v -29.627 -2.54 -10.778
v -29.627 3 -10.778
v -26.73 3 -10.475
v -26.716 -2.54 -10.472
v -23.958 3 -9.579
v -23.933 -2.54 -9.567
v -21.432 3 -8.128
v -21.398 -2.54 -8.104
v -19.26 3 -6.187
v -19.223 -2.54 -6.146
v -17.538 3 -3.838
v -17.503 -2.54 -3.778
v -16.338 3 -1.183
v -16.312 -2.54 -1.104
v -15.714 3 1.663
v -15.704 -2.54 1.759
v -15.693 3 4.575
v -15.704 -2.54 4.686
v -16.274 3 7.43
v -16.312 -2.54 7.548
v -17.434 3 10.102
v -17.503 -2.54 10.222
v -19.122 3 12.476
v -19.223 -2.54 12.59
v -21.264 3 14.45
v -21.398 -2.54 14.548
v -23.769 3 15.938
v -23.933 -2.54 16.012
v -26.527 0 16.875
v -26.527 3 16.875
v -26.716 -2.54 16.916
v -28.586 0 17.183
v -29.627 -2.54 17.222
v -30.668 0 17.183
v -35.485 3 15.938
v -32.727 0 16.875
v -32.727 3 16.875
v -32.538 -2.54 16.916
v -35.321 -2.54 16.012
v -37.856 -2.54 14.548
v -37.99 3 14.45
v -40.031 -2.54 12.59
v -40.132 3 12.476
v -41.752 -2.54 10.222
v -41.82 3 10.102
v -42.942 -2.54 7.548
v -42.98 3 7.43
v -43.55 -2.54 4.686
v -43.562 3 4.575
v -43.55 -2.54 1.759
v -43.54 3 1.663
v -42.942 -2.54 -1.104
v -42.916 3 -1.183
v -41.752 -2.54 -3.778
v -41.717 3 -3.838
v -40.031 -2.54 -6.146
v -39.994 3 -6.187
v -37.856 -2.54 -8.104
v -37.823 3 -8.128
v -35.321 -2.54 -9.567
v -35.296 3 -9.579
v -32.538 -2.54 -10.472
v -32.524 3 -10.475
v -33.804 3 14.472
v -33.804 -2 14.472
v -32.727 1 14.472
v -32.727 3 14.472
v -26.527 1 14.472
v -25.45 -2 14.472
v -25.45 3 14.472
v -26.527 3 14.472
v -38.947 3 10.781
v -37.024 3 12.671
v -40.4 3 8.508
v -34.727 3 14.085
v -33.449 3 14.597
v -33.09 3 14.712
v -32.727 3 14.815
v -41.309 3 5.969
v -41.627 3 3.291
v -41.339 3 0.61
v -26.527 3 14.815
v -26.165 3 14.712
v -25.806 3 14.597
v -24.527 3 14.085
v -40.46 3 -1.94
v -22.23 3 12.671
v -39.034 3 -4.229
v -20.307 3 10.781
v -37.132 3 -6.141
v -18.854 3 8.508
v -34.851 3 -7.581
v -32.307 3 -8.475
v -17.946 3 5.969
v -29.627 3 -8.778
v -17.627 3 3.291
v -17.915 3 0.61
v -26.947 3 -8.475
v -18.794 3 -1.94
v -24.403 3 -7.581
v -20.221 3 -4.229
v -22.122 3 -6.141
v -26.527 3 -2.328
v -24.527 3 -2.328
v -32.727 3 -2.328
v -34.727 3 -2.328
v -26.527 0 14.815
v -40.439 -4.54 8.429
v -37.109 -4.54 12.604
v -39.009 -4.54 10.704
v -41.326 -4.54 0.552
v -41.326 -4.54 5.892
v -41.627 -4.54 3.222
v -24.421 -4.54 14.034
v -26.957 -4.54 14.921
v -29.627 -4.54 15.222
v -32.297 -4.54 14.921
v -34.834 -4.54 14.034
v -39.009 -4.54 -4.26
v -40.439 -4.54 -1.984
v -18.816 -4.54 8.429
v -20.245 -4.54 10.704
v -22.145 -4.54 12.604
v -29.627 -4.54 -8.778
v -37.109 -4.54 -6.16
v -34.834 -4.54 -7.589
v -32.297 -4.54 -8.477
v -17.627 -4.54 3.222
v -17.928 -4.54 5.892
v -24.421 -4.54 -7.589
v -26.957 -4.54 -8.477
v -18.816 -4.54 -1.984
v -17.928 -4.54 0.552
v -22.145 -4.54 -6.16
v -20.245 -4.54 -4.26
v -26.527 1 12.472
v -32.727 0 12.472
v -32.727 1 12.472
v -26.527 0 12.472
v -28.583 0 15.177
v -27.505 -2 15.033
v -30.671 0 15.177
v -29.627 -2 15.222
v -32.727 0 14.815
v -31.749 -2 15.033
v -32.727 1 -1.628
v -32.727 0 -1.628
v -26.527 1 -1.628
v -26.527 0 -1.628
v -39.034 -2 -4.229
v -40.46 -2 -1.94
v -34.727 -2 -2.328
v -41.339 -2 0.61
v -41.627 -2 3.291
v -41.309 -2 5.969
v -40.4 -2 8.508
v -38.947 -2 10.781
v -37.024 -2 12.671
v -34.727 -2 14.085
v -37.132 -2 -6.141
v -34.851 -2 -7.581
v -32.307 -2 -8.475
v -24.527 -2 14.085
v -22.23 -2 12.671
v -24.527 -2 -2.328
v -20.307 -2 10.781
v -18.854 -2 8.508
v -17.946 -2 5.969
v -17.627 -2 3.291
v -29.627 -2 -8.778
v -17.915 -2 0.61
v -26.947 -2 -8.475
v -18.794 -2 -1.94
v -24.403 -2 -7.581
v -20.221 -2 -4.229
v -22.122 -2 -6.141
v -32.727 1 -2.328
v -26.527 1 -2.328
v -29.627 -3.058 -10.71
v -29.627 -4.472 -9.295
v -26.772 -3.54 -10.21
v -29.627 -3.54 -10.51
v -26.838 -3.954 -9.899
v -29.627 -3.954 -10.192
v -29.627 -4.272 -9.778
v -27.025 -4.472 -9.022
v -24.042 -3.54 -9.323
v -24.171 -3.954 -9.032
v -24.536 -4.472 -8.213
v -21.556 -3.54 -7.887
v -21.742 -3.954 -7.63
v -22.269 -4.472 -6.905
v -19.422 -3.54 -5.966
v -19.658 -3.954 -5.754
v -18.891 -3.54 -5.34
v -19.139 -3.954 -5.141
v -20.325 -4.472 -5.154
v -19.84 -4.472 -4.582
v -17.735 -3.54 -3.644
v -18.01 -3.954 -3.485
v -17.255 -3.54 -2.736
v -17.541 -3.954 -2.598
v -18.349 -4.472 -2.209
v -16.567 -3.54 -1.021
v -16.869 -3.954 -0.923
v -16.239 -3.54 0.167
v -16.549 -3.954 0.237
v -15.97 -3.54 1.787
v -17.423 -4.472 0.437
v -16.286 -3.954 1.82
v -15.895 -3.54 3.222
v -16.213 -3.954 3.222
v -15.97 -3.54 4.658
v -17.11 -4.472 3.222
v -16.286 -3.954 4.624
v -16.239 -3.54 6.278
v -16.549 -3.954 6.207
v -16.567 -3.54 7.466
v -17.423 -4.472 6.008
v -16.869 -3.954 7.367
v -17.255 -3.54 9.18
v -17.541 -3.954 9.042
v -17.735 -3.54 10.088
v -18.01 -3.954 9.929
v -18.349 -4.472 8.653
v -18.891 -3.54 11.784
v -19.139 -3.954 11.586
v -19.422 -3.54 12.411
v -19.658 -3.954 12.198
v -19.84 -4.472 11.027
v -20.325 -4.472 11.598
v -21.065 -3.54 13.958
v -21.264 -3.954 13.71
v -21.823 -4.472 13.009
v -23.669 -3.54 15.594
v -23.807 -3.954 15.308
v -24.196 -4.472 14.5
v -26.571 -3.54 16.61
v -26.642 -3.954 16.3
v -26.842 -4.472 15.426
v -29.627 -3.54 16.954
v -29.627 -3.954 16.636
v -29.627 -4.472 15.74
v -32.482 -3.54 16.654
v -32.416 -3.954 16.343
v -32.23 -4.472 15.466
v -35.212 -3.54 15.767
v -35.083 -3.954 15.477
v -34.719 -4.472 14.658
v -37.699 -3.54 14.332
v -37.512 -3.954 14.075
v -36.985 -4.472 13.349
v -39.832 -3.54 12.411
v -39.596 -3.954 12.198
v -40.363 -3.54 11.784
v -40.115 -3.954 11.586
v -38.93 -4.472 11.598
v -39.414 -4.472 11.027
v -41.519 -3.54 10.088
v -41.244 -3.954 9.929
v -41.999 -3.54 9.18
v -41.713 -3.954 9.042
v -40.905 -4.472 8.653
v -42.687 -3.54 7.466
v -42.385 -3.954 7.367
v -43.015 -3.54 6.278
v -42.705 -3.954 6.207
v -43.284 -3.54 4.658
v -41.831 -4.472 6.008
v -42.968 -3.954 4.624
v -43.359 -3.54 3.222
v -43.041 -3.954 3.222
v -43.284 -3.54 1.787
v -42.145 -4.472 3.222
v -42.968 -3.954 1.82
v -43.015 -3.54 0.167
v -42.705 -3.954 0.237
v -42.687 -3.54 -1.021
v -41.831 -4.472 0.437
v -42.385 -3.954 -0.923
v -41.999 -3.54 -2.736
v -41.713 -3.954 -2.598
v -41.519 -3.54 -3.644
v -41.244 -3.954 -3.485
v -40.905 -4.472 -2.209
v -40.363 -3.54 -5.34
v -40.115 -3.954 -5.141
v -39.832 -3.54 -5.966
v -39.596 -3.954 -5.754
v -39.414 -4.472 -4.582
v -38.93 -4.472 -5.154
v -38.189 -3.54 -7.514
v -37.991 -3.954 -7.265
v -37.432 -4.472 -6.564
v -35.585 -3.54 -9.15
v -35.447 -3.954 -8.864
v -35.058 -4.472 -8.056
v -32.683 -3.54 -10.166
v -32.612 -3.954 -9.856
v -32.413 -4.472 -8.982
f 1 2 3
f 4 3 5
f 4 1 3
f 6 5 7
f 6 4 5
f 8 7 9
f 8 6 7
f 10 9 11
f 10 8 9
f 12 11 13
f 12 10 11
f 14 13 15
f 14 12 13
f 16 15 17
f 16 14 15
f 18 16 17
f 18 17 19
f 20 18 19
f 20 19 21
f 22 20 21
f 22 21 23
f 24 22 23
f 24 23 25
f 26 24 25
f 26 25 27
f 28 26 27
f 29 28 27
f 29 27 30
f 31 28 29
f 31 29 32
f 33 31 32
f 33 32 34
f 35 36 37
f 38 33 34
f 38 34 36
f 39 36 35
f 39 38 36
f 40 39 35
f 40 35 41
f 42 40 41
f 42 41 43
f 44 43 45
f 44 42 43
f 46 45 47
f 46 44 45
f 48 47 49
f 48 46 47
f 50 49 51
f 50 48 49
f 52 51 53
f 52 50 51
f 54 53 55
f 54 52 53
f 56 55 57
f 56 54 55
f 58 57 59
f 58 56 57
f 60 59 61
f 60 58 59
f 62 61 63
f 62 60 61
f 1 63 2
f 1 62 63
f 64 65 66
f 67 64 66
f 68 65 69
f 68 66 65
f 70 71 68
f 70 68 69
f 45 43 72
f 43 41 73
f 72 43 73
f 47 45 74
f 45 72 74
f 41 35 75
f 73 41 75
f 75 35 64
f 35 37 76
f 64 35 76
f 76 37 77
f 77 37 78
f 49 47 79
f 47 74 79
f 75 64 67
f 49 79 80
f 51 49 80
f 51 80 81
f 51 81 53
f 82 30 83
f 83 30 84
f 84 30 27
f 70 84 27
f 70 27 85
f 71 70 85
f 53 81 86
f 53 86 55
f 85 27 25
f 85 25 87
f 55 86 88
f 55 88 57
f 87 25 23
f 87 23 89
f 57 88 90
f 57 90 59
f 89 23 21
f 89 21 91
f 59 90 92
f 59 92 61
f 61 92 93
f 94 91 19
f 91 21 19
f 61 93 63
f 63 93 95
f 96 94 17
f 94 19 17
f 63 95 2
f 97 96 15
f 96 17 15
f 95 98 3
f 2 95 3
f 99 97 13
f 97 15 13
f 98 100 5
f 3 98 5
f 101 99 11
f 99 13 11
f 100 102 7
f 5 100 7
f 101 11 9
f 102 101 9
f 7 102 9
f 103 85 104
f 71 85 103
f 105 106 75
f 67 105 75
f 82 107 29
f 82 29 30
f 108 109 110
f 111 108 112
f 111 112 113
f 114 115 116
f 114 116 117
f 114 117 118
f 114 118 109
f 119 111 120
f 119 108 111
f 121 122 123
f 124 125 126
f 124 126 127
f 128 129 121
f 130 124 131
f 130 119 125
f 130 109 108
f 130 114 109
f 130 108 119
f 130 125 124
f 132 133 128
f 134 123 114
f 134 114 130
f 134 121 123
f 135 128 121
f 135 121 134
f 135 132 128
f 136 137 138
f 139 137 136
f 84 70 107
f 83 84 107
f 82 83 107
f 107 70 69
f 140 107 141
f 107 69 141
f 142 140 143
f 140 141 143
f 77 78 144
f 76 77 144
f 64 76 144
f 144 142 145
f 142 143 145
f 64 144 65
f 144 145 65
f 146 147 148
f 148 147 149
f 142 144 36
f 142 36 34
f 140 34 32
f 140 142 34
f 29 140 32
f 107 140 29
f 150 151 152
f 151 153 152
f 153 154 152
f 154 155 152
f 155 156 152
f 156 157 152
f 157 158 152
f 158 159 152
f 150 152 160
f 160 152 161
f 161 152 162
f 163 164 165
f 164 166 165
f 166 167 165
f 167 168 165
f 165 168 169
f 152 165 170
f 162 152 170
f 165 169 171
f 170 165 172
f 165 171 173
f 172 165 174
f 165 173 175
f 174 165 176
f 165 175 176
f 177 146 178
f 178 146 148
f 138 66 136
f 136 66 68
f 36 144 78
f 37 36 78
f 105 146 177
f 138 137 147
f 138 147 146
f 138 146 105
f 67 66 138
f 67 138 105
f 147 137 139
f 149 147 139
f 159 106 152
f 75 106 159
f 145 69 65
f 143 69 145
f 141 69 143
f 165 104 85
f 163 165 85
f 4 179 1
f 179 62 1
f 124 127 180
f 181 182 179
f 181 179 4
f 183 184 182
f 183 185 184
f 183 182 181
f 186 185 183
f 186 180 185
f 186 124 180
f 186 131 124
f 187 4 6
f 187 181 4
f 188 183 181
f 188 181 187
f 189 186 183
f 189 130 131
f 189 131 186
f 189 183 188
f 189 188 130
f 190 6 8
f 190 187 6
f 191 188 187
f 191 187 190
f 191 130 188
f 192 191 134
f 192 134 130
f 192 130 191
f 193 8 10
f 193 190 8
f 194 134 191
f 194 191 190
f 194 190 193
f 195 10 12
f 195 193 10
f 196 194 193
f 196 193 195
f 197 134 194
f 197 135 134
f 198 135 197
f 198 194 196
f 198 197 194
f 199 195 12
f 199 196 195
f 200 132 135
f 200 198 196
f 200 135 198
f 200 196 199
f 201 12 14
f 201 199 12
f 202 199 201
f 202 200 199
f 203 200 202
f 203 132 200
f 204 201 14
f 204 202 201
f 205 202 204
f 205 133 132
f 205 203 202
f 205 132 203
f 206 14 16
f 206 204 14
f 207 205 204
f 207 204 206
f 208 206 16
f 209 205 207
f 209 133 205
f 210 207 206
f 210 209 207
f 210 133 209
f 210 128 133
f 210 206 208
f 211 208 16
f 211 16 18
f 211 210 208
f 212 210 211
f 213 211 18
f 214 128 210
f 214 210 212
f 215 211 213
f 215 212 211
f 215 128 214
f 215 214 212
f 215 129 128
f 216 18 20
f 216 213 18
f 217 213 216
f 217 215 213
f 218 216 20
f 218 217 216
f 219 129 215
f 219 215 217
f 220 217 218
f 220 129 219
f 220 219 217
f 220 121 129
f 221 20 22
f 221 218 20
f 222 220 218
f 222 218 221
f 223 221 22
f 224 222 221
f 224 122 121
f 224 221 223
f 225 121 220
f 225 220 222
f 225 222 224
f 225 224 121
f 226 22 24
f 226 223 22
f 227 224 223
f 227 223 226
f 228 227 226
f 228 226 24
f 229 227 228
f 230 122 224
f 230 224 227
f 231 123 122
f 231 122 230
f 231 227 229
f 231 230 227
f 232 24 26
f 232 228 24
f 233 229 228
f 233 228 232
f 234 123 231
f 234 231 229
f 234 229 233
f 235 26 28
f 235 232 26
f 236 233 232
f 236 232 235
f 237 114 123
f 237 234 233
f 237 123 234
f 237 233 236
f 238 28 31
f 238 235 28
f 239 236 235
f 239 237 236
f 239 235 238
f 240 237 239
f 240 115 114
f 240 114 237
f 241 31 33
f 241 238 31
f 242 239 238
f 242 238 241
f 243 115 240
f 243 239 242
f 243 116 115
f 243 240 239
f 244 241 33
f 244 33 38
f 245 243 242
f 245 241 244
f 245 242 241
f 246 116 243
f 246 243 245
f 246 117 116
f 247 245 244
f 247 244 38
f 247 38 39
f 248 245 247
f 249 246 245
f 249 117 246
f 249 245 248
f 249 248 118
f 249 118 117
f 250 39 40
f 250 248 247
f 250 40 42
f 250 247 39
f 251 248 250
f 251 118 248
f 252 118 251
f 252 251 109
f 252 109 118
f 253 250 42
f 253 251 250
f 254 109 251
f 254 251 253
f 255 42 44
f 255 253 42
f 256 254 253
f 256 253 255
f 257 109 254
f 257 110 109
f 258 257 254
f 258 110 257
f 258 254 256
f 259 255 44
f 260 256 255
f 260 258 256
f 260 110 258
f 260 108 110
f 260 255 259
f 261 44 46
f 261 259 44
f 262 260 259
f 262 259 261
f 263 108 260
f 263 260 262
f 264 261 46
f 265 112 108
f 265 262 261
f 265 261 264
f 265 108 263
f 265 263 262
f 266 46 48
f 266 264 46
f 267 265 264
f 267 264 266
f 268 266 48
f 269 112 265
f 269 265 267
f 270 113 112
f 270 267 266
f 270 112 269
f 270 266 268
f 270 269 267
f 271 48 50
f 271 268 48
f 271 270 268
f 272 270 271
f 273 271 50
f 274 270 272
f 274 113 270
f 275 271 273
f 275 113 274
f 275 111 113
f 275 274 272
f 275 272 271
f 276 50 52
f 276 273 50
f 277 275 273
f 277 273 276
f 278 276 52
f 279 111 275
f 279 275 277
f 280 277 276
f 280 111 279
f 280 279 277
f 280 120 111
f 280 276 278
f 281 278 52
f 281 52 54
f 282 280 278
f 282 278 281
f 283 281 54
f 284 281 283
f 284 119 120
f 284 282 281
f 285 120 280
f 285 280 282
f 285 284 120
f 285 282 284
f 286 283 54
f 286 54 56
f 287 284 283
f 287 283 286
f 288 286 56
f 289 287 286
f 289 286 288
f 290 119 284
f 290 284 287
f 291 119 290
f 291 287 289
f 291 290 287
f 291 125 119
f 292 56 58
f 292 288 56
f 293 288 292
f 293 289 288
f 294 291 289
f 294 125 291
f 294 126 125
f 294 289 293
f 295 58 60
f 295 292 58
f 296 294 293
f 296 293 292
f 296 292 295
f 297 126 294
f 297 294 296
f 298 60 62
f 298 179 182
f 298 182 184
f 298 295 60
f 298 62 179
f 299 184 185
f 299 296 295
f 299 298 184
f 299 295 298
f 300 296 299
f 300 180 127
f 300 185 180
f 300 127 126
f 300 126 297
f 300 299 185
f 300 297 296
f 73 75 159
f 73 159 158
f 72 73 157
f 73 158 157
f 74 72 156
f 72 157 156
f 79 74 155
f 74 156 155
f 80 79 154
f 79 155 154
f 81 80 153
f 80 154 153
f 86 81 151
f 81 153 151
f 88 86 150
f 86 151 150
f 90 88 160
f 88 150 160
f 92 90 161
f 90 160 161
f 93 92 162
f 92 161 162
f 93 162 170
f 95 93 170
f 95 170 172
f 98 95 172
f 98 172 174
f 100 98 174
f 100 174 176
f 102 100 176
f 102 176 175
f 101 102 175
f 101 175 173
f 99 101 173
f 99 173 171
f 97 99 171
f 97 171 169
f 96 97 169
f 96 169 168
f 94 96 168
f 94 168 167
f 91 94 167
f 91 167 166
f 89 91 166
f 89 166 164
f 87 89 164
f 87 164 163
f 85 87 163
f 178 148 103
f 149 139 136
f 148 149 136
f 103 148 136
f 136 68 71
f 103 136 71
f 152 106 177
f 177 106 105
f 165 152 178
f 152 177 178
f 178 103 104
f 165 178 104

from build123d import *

# Parameters (mm, degrees)
SKETCH1_W           = 10.2
SKETCH1_H           = 16.8
SKETCH1_W_2         = 6.2
SKETCH1_H_2         = 14.1
BOSS_EXTRUDE1_DEPTH = 3
SKETCH2_W           = 6.2
SKETCH2_H           = 2
CUT_EXTRUDE1_DEPTH  = 25.4
SKETCH3_W           = 10.2
SKETCH3_H           = 16.8
BOSS_EXTRUDE2_DEPTH = 2
SKETCH4_R           = 14
SKETCH4_R_2         = 12
BOSS_EXTRUDE4_DEPTH = 5
BOSS_EXTRUDE5_START = 2.54
SKETCH5_R           = 14
BOSS_EXTRUDE5_DEPTH = 2.54
SKETCH6_W           = 6.2
SKETCH6_H           = 3
CUT_EXTRUDE2_DEPTH  = 7.62
FILLET1_R           = 2


with BuildPart() as part:
    # Sketch1 → Boss-Extrude1 (new body)
    with BuildSketch(Plane(origin=(0, 0, 0), x_dir=(1, 0, 0), z_dir=(0, 1, 0))):
        with Locations((-29.627149571, -6.071905286)):
            Rectangle(SKETCH1_W, SKETCH1_H)
        with Locations((-29.627149571, -5.421905286)):
            Rectangle(SKETCH1_W_2, SKETCH1_H_2, mode=Mode.SUBTRACT)
    extrude(amount=BOSS_EXTRUDE1_DEPTH)

    # Sketch2 → Cut-Extrude1 (cut)
    with BuildSketch(Plane.XY.offset(14.471905286)):
        with Locations((-29.627149571, 2)):
            Rectangle(SKETCH2_W, SKETCH2_H)
    extrude(amount=-CUT_EXTRUDE1_DEPTH, mode=Mode.SUBTRACT)

    # Sketch3 → Boss-Extrude2 (add)
    with BuildSketch(Plane.XZ):
        with Locations((-29.627149571, 6.071905286)):
            Rectangle(SKETCH3_W, SKETCH3_H)
    extrude(amount=BOSS_EXTRUDE2_DEPTH)

    # Sketch4 → Boss-Extrude4 (add)
    with BuildSketch(Plane.XZ.offset(2)):
        with Locations(Location((-29.627149571, 3.222245286, 0), (0, 0, 270))):
            Circle(SKETCH4_R)
        with Locations((-29.627149571, 3.222245286)):
            Circle(SKETCH4_R_2, mode=Mode.SUBTRACT)
    extrude(amount=-BOSS_EXTRUDE4_DEPTH)

    # Sketch5 → Boss-Extrude5 (add)
    with BuildSketch(Plane.XZ.offset(2).offset(BOSS_EXTRUDE5_START)):
        with Locations(Location((-29.627149571, 3.222245286, 0), (0, 0, 270))):
            Circle(SKETCH5_R)
    extrude(amount=-BOSS_EXTRUDE5_DEPTH)

    # Sketch6 → Cut-Extrude2 (cut)
    with BuildSketch(Plane.XY.offset(14.471905286)):
        with Locations((-29.627149571, 1.5)):
            Rectangle(SKETCH6_W, SKETCH6_H)
    extrude(amount=CUT_EXTRUDE2_DEPTH, mode=Mode.SUBTRACT)

    # Fillet1
    fillet1_edges = [part.edges().sort_by_distance(p)[0] for p in [
        (-29.627149571, -4.54, 17.222245286),
    ]]
    fillet(fillet1_edges, radius=FILLET1_R)


solid = part.part
